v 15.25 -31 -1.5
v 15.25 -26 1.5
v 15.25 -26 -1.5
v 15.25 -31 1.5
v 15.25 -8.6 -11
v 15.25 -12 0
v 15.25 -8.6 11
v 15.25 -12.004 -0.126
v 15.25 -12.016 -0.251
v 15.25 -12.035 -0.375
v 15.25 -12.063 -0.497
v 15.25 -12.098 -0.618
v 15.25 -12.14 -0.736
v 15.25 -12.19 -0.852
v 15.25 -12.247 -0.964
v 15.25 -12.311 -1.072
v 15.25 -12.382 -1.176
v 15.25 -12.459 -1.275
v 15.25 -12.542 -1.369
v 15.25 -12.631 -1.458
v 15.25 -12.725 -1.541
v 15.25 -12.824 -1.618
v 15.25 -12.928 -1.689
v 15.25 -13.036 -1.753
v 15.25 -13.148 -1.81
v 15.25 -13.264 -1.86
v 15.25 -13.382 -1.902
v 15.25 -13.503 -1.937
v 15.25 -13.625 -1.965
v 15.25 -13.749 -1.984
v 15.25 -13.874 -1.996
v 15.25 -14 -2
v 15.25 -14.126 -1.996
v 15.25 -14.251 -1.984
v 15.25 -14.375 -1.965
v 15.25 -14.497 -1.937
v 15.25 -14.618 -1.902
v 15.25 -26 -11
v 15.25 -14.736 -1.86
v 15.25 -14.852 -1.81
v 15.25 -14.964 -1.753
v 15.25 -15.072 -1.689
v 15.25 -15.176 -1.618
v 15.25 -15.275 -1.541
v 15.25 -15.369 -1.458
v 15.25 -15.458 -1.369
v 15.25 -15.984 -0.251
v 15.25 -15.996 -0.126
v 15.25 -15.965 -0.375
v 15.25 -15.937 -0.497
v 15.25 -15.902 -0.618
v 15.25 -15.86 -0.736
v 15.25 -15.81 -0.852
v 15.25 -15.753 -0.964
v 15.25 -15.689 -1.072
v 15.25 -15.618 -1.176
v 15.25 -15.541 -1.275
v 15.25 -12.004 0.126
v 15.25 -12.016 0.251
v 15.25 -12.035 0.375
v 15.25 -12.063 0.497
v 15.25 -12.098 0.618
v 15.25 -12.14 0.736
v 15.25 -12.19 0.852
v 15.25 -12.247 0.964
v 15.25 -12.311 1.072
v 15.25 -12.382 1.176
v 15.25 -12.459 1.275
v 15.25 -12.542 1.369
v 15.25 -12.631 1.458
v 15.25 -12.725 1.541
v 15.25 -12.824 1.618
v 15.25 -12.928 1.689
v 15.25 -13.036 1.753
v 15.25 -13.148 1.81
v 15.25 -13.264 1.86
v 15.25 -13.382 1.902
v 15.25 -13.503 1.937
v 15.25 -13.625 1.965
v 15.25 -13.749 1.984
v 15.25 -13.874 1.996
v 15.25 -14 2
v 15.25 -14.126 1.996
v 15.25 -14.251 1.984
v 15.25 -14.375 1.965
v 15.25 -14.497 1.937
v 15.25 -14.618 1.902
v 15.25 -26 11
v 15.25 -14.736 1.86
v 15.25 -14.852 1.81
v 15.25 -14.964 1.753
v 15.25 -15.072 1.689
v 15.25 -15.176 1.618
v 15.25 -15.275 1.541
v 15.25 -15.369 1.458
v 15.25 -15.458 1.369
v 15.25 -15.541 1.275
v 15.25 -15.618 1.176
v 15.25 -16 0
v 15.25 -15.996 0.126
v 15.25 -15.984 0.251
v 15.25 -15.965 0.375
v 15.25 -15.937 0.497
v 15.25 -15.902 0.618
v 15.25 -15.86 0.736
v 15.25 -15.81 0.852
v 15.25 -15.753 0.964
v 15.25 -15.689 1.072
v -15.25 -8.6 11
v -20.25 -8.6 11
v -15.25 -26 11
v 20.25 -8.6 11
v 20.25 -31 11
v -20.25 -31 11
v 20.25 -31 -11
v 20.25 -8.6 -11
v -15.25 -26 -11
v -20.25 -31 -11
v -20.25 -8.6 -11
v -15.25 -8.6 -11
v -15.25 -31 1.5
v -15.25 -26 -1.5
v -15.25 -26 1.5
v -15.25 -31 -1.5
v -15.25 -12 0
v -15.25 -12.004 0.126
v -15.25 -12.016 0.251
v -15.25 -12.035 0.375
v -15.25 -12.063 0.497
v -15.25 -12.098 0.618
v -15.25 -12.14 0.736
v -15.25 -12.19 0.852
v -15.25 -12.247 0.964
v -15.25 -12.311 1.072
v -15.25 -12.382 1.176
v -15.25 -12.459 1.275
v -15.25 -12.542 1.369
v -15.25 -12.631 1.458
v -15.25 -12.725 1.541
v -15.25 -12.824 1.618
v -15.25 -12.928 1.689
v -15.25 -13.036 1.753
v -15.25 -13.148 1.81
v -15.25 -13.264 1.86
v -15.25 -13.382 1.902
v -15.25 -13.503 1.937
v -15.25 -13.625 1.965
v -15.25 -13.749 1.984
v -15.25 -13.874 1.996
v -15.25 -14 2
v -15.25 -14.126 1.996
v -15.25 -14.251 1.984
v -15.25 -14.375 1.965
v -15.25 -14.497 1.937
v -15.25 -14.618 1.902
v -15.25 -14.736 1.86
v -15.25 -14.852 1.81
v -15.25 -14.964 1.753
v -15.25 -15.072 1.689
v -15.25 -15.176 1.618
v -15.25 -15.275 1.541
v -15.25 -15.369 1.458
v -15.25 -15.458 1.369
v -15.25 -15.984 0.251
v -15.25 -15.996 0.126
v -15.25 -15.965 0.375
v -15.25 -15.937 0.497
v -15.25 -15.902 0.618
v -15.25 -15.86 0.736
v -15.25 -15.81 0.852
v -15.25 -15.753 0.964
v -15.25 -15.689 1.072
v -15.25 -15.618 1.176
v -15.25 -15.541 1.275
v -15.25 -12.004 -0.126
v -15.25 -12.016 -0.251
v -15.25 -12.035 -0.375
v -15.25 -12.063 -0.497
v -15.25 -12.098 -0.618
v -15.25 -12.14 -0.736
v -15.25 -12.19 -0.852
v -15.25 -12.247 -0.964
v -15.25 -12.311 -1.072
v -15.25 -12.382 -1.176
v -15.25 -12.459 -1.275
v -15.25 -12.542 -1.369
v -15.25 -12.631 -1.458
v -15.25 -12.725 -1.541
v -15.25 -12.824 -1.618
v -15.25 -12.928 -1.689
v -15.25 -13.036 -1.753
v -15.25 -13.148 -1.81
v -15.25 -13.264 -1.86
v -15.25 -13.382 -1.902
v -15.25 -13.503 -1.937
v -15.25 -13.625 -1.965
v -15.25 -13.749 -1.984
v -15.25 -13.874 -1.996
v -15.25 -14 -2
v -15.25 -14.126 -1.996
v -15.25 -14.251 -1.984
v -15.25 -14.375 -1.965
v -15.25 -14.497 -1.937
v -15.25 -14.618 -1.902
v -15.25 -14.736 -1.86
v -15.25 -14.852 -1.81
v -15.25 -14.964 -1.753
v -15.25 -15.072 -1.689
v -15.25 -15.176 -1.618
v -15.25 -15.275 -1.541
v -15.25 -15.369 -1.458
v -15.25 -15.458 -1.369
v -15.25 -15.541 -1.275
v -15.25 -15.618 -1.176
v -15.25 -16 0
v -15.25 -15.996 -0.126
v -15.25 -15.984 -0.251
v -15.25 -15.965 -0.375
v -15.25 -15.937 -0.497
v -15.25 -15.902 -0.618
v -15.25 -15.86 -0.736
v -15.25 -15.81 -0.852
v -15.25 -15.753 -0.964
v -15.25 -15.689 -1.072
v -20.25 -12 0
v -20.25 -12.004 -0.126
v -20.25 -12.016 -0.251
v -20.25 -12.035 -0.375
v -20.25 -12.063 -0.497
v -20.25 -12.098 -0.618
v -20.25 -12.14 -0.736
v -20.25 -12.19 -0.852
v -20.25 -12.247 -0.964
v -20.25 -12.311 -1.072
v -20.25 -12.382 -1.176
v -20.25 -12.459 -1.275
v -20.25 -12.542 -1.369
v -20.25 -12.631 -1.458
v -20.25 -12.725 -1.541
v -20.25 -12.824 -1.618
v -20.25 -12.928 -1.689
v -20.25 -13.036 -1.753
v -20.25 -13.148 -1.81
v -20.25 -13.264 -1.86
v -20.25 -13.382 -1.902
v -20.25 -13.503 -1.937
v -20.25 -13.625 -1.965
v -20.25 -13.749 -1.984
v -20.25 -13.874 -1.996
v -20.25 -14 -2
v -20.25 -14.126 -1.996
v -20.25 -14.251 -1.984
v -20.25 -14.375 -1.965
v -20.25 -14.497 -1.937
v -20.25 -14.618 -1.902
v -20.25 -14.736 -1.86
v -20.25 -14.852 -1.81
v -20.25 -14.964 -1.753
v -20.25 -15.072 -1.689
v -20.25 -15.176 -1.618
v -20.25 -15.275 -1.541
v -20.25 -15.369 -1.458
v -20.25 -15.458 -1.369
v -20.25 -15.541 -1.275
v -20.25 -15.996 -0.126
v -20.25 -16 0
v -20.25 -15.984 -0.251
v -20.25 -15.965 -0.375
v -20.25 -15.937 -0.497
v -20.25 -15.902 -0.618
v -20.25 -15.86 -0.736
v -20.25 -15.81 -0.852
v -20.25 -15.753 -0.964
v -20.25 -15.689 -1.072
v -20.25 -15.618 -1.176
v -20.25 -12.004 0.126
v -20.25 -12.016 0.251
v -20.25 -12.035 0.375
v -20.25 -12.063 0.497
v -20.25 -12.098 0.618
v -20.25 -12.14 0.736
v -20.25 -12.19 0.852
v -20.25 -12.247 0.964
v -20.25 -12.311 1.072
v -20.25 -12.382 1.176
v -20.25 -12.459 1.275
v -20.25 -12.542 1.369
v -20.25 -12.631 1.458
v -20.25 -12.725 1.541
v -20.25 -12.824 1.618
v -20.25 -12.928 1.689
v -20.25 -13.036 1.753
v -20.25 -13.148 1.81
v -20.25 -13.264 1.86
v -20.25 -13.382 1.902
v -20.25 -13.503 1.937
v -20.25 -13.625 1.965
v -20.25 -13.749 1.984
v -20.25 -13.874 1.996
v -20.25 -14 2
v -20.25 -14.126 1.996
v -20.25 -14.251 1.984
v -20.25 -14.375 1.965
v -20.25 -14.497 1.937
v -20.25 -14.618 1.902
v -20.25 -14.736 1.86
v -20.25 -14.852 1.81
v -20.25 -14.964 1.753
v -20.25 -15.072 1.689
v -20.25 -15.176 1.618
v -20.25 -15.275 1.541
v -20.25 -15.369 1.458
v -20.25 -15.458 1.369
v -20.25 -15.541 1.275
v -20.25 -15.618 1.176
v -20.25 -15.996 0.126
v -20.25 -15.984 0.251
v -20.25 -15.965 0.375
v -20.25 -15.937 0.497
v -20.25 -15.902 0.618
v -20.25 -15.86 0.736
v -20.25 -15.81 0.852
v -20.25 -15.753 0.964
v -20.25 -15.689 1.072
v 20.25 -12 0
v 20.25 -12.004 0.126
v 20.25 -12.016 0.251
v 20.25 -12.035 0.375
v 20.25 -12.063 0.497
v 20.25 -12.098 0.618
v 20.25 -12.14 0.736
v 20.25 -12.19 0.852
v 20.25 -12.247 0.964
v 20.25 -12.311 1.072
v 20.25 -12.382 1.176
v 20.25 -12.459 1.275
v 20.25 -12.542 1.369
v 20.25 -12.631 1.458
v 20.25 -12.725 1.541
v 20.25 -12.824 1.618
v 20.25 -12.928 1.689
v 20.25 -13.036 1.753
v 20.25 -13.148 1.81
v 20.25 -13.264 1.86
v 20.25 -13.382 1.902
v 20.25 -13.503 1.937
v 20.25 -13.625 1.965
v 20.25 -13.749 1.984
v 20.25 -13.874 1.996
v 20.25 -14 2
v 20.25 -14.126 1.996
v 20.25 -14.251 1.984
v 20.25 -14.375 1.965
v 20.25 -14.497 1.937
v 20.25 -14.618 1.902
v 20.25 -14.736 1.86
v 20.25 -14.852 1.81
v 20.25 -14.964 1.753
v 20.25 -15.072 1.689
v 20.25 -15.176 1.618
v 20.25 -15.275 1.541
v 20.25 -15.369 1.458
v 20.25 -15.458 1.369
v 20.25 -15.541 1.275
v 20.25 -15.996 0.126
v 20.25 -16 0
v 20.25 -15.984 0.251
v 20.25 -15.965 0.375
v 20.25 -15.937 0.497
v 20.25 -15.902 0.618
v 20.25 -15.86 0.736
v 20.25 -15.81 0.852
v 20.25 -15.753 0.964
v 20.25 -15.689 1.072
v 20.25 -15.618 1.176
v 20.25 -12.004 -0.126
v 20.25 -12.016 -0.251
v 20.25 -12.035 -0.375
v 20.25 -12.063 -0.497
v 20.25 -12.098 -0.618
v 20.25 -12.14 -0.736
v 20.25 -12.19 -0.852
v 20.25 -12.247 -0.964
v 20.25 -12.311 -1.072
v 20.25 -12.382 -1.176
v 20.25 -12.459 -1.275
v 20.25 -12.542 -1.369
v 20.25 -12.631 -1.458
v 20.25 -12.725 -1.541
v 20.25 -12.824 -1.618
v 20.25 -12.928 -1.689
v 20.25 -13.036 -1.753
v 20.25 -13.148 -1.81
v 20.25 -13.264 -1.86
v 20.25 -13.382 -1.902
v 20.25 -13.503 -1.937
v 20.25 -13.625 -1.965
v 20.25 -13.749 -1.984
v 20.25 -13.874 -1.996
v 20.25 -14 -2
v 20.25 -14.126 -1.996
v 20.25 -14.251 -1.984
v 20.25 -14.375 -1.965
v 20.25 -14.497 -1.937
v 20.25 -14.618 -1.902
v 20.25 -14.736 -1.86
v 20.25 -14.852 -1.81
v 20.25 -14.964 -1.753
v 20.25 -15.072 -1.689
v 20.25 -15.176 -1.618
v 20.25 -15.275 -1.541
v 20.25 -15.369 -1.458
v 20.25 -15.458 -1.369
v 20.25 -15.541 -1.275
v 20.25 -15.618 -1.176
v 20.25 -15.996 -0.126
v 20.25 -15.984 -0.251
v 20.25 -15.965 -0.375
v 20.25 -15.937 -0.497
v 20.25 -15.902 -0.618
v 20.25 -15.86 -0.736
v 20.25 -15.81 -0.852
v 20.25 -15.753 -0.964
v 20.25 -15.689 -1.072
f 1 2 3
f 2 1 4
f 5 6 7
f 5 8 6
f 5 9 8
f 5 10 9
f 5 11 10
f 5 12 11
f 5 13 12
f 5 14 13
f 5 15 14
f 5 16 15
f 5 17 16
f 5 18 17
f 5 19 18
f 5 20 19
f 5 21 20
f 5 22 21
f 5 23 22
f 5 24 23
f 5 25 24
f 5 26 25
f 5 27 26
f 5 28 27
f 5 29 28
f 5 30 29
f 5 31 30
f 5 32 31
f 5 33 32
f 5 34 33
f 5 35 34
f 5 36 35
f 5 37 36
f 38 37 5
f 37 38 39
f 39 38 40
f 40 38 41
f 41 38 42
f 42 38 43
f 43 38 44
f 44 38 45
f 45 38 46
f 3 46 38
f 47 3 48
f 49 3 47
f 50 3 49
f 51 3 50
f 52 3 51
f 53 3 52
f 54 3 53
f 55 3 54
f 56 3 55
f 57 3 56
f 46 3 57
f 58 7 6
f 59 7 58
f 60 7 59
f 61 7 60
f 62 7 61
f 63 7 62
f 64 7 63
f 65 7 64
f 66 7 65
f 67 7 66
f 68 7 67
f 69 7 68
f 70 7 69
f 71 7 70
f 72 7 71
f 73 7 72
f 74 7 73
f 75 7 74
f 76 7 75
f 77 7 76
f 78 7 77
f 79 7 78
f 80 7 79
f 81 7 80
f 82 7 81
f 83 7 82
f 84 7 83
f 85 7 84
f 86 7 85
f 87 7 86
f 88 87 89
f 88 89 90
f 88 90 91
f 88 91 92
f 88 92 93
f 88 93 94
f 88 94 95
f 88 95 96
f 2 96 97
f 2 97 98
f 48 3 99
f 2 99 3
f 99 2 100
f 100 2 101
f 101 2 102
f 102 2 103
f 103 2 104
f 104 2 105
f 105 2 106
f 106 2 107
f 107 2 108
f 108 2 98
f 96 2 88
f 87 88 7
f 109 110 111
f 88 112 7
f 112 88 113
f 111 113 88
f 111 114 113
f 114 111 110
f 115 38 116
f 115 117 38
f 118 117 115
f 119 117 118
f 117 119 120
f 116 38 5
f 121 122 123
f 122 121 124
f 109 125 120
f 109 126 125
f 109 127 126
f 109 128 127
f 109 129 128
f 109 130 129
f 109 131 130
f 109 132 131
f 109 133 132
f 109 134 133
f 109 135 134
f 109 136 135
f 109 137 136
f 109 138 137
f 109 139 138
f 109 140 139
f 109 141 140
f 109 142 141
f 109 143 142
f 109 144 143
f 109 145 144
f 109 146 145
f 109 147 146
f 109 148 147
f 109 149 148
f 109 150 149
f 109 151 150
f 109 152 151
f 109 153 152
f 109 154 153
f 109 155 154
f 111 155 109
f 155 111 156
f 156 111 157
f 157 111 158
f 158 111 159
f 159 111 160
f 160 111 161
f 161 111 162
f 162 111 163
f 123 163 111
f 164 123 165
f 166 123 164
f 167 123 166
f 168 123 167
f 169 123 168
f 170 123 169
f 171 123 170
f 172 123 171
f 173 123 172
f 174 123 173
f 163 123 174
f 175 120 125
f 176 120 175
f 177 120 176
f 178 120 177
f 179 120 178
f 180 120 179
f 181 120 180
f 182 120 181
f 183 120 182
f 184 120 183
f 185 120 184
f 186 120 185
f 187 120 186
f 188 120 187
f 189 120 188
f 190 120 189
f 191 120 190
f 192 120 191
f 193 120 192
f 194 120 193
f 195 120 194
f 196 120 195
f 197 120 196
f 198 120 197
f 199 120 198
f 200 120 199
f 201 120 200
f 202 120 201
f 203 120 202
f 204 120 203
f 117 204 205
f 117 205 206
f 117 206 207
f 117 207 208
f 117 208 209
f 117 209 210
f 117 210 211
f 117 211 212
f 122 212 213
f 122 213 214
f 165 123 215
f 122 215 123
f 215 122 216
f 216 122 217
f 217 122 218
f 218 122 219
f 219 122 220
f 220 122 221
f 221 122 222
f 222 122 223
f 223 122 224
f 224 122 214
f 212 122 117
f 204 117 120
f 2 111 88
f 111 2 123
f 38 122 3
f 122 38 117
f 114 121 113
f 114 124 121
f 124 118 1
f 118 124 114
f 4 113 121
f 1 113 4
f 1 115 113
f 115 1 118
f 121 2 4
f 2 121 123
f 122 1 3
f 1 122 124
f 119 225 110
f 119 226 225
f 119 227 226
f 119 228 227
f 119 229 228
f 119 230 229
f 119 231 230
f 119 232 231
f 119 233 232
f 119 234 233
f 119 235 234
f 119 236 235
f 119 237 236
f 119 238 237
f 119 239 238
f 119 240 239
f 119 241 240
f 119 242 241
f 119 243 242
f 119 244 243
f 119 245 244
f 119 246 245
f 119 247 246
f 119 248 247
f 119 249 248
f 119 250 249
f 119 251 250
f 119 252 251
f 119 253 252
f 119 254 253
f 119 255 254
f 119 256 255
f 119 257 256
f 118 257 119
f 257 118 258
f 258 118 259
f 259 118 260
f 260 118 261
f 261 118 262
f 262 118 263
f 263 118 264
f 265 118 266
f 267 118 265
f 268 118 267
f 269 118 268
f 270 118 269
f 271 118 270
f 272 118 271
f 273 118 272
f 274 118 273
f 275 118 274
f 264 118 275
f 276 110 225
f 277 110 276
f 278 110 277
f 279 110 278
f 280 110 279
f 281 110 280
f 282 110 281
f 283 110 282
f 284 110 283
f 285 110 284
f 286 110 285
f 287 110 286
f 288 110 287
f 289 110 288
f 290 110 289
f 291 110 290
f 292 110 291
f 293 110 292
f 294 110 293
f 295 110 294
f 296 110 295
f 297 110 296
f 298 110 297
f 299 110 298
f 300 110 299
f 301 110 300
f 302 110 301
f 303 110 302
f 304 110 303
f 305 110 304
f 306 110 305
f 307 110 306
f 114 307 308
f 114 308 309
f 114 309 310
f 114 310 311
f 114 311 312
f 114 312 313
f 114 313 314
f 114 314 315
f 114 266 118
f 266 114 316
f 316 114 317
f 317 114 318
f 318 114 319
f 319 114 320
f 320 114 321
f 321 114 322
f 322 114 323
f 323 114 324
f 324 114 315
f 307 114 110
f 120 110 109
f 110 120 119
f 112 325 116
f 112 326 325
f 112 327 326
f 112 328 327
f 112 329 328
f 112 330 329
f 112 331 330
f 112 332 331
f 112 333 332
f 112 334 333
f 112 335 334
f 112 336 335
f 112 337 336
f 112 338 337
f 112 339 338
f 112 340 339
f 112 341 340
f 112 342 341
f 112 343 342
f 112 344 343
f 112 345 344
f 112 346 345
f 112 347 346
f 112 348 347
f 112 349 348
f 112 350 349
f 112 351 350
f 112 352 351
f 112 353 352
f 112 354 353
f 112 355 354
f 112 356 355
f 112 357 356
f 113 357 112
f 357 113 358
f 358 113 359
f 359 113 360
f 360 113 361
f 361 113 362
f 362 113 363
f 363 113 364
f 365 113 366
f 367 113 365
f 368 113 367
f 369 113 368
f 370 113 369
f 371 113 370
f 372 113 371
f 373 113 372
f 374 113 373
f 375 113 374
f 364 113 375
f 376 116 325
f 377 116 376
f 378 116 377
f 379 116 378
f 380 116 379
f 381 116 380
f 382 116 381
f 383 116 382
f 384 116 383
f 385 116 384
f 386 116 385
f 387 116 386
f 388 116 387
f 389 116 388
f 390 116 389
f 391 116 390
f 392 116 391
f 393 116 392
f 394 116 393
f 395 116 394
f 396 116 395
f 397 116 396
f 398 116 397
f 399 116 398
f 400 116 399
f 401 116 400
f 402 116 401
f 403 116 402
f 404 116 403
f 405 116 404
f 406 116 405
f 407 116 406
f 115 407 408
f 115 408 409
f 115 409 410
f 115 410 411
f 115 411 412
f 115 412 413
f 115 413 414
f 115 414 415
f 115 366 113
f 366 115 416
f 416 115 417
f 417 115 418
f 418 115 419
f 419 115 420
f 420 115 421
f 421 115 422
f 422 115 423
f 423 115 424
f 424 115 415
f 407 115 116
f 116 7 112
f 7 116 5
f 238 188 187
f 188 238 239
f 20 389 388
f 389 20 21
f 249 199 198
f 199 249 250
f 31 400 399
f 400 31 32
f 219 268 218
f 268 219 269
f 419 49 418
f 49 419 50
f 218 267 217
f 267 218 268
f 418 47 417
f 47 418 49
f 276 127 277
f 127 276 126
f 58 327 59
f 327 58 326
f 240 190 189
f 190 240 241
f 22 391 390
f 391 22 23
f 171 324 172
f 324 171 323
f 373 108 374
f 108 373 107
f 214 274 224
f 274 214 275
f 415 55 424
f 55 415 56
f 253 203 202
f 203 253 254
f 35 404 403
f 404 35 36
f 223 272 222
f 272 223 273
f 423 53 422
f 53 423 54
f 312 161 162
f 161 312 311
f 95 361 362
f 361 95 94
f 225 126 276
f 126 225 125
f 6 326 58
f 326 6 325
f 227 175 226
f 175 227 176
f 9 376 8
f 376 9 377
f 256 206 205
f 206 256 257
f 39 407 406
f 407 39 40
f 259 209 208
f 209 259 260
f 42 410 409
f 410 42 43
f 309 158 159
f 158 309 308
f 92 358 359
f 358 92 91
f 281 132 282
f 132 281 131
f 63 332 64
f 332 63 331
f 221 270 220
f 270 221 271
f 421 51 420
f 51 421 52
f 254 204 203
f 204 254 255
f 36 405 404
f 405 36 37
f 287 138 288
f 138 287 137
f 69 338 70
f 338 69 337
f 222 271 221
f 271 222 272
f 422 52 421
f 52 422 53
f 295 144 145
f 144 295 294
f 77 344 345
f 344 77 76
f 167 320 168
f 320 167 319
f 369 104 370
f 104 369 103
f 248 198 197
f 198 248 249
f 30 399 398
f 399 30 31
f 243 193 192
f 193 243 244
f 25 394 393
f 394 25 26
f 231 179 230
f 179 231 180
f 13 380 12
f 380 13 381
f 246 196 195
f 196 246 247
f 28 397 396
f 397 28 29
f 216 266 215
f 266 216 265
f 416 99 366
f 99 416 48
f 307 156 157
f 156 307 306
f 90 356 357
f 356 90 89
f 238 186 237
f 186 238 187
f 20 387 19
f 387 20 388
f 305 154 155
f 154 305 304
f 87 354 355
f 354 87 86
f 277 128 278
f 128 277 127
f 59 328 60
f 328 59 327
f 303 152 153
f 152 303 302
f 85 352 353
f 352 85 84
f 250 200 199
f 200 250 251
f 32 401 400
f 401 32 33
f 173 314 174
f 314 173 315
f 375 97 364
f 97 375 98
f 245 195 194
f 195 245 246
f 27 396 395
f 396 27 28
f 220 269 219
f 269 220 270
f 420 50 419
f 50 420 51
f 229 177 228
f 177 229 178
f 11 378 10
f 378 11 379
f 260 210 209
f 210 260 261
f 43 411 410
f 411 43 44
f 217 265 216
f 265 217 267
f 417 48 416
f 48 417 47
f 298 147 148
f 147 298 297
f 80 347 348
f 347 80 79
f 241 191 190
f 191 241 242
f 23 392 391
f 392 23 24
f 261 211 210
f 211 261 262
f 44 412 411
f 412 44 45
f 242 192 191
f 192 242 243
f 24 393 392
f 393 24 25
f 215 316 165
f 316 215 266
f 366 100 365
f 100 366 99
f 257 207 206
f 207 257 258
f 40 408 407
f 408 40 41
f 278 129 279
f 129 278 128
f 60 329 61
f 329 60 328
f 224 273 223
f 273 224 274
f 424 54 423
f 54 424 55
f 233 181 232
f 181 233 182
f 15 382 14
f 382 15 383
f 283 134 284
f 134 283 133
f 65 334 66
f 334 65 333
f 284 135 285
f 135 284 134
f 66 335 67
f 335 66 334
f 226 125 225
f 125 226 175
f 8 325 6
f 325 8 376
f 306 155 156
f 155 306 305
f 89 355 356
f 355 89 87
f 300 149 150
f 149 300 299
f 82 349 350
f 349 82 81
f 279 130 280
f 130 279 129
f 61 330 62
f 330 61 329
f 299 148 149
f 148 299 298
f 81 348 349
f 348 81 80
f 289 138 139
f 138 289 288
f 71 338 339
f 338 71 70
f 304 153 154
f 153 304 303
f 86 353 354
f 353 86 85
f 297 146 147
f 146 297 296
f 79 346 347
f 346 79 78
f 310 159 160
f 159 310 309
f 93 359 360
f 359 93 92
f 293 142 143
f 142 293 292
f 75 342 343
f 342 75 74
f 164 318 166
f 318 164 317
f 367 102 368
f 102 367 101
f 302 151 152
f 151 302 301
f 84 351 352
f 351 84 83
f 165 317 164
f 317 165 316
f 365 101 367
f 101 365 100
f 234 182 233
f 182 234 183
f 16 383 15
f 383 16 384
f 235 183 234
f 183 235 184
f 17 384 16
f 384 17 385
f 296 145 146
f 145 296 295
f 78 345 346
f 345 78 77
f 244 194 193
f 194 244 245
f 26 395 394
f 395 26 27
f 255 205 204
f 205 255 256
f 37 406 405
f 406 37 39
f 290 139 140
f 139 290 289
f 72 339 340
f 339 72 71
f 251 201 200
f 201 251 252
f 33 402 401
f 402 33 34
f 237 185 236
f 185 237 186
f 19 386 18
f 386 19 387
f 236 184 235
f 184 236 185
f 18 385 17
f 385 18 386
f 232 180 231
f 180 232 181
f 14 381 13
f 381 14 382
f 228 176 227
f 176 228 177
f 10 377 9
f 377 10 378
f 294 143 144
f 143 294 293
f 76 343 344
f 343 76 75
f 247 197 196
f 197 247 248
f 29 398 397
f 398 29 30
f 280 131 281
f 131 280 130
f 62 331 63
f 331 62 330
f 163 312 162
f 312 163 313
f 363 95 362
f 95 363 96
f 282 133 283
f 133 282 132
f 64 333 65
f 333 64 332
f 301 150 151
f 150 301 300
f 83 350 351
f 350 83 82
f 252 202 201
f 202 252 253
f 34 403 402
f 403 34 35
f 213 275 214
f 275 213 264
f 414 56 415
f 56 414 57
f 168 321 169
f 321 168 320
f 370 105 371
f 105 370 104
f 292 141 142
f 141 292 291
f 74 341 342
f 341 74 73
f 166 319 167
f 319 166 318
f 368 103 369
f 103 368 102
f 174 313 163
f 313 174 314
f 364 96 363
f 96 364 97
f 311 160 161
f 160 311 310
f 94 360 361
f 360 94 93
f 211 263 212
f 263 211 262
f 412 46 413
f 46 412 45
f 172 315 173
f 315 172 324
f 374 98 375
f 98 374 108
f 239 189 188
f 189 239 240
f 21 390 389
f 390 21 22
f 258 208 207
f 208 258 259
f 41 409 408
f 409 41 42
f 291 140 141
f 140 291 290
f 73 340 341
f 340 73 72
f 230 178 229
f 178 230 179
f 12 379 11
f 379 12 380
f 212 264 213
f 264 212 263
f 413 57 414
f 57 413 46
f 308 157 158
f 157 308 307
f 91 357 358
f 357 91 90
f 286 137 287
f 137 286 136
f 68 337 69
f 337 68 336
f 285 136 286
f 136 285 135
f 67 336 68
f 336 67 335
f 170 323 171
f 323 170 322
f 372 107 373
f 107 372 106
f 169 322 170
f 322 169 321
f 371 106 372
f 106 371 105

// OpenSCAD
block_z = 22;
block_y = 42;
block_x = 30;
connector_gap = 0.5;

$fn = 100;

difference() {
  translate([-block_x/2 - connector_gap/2, -block_y/2 - 10, -block_z/2]) {
    difference() {
      cube([block_x + connector_gap, 5, block_z]);
      translate([block_x, 0, block_z/2])
      cube([block_x*2, block_y, 3], center=true);
    }
    translate([-5, 0, 0])
      cube([5, block_y/3 + block_y/5, block_z]);
    translate([block_x + connector_gap, 0, 0])
      cube([5, block_y/3 + block_y/5, block_z]);
  }

  translate([-block_x/2 - 50, -block_y/3, 0])
    rotate([0, 90, 0])
    cylinder(r=4/2, h=100);
}
